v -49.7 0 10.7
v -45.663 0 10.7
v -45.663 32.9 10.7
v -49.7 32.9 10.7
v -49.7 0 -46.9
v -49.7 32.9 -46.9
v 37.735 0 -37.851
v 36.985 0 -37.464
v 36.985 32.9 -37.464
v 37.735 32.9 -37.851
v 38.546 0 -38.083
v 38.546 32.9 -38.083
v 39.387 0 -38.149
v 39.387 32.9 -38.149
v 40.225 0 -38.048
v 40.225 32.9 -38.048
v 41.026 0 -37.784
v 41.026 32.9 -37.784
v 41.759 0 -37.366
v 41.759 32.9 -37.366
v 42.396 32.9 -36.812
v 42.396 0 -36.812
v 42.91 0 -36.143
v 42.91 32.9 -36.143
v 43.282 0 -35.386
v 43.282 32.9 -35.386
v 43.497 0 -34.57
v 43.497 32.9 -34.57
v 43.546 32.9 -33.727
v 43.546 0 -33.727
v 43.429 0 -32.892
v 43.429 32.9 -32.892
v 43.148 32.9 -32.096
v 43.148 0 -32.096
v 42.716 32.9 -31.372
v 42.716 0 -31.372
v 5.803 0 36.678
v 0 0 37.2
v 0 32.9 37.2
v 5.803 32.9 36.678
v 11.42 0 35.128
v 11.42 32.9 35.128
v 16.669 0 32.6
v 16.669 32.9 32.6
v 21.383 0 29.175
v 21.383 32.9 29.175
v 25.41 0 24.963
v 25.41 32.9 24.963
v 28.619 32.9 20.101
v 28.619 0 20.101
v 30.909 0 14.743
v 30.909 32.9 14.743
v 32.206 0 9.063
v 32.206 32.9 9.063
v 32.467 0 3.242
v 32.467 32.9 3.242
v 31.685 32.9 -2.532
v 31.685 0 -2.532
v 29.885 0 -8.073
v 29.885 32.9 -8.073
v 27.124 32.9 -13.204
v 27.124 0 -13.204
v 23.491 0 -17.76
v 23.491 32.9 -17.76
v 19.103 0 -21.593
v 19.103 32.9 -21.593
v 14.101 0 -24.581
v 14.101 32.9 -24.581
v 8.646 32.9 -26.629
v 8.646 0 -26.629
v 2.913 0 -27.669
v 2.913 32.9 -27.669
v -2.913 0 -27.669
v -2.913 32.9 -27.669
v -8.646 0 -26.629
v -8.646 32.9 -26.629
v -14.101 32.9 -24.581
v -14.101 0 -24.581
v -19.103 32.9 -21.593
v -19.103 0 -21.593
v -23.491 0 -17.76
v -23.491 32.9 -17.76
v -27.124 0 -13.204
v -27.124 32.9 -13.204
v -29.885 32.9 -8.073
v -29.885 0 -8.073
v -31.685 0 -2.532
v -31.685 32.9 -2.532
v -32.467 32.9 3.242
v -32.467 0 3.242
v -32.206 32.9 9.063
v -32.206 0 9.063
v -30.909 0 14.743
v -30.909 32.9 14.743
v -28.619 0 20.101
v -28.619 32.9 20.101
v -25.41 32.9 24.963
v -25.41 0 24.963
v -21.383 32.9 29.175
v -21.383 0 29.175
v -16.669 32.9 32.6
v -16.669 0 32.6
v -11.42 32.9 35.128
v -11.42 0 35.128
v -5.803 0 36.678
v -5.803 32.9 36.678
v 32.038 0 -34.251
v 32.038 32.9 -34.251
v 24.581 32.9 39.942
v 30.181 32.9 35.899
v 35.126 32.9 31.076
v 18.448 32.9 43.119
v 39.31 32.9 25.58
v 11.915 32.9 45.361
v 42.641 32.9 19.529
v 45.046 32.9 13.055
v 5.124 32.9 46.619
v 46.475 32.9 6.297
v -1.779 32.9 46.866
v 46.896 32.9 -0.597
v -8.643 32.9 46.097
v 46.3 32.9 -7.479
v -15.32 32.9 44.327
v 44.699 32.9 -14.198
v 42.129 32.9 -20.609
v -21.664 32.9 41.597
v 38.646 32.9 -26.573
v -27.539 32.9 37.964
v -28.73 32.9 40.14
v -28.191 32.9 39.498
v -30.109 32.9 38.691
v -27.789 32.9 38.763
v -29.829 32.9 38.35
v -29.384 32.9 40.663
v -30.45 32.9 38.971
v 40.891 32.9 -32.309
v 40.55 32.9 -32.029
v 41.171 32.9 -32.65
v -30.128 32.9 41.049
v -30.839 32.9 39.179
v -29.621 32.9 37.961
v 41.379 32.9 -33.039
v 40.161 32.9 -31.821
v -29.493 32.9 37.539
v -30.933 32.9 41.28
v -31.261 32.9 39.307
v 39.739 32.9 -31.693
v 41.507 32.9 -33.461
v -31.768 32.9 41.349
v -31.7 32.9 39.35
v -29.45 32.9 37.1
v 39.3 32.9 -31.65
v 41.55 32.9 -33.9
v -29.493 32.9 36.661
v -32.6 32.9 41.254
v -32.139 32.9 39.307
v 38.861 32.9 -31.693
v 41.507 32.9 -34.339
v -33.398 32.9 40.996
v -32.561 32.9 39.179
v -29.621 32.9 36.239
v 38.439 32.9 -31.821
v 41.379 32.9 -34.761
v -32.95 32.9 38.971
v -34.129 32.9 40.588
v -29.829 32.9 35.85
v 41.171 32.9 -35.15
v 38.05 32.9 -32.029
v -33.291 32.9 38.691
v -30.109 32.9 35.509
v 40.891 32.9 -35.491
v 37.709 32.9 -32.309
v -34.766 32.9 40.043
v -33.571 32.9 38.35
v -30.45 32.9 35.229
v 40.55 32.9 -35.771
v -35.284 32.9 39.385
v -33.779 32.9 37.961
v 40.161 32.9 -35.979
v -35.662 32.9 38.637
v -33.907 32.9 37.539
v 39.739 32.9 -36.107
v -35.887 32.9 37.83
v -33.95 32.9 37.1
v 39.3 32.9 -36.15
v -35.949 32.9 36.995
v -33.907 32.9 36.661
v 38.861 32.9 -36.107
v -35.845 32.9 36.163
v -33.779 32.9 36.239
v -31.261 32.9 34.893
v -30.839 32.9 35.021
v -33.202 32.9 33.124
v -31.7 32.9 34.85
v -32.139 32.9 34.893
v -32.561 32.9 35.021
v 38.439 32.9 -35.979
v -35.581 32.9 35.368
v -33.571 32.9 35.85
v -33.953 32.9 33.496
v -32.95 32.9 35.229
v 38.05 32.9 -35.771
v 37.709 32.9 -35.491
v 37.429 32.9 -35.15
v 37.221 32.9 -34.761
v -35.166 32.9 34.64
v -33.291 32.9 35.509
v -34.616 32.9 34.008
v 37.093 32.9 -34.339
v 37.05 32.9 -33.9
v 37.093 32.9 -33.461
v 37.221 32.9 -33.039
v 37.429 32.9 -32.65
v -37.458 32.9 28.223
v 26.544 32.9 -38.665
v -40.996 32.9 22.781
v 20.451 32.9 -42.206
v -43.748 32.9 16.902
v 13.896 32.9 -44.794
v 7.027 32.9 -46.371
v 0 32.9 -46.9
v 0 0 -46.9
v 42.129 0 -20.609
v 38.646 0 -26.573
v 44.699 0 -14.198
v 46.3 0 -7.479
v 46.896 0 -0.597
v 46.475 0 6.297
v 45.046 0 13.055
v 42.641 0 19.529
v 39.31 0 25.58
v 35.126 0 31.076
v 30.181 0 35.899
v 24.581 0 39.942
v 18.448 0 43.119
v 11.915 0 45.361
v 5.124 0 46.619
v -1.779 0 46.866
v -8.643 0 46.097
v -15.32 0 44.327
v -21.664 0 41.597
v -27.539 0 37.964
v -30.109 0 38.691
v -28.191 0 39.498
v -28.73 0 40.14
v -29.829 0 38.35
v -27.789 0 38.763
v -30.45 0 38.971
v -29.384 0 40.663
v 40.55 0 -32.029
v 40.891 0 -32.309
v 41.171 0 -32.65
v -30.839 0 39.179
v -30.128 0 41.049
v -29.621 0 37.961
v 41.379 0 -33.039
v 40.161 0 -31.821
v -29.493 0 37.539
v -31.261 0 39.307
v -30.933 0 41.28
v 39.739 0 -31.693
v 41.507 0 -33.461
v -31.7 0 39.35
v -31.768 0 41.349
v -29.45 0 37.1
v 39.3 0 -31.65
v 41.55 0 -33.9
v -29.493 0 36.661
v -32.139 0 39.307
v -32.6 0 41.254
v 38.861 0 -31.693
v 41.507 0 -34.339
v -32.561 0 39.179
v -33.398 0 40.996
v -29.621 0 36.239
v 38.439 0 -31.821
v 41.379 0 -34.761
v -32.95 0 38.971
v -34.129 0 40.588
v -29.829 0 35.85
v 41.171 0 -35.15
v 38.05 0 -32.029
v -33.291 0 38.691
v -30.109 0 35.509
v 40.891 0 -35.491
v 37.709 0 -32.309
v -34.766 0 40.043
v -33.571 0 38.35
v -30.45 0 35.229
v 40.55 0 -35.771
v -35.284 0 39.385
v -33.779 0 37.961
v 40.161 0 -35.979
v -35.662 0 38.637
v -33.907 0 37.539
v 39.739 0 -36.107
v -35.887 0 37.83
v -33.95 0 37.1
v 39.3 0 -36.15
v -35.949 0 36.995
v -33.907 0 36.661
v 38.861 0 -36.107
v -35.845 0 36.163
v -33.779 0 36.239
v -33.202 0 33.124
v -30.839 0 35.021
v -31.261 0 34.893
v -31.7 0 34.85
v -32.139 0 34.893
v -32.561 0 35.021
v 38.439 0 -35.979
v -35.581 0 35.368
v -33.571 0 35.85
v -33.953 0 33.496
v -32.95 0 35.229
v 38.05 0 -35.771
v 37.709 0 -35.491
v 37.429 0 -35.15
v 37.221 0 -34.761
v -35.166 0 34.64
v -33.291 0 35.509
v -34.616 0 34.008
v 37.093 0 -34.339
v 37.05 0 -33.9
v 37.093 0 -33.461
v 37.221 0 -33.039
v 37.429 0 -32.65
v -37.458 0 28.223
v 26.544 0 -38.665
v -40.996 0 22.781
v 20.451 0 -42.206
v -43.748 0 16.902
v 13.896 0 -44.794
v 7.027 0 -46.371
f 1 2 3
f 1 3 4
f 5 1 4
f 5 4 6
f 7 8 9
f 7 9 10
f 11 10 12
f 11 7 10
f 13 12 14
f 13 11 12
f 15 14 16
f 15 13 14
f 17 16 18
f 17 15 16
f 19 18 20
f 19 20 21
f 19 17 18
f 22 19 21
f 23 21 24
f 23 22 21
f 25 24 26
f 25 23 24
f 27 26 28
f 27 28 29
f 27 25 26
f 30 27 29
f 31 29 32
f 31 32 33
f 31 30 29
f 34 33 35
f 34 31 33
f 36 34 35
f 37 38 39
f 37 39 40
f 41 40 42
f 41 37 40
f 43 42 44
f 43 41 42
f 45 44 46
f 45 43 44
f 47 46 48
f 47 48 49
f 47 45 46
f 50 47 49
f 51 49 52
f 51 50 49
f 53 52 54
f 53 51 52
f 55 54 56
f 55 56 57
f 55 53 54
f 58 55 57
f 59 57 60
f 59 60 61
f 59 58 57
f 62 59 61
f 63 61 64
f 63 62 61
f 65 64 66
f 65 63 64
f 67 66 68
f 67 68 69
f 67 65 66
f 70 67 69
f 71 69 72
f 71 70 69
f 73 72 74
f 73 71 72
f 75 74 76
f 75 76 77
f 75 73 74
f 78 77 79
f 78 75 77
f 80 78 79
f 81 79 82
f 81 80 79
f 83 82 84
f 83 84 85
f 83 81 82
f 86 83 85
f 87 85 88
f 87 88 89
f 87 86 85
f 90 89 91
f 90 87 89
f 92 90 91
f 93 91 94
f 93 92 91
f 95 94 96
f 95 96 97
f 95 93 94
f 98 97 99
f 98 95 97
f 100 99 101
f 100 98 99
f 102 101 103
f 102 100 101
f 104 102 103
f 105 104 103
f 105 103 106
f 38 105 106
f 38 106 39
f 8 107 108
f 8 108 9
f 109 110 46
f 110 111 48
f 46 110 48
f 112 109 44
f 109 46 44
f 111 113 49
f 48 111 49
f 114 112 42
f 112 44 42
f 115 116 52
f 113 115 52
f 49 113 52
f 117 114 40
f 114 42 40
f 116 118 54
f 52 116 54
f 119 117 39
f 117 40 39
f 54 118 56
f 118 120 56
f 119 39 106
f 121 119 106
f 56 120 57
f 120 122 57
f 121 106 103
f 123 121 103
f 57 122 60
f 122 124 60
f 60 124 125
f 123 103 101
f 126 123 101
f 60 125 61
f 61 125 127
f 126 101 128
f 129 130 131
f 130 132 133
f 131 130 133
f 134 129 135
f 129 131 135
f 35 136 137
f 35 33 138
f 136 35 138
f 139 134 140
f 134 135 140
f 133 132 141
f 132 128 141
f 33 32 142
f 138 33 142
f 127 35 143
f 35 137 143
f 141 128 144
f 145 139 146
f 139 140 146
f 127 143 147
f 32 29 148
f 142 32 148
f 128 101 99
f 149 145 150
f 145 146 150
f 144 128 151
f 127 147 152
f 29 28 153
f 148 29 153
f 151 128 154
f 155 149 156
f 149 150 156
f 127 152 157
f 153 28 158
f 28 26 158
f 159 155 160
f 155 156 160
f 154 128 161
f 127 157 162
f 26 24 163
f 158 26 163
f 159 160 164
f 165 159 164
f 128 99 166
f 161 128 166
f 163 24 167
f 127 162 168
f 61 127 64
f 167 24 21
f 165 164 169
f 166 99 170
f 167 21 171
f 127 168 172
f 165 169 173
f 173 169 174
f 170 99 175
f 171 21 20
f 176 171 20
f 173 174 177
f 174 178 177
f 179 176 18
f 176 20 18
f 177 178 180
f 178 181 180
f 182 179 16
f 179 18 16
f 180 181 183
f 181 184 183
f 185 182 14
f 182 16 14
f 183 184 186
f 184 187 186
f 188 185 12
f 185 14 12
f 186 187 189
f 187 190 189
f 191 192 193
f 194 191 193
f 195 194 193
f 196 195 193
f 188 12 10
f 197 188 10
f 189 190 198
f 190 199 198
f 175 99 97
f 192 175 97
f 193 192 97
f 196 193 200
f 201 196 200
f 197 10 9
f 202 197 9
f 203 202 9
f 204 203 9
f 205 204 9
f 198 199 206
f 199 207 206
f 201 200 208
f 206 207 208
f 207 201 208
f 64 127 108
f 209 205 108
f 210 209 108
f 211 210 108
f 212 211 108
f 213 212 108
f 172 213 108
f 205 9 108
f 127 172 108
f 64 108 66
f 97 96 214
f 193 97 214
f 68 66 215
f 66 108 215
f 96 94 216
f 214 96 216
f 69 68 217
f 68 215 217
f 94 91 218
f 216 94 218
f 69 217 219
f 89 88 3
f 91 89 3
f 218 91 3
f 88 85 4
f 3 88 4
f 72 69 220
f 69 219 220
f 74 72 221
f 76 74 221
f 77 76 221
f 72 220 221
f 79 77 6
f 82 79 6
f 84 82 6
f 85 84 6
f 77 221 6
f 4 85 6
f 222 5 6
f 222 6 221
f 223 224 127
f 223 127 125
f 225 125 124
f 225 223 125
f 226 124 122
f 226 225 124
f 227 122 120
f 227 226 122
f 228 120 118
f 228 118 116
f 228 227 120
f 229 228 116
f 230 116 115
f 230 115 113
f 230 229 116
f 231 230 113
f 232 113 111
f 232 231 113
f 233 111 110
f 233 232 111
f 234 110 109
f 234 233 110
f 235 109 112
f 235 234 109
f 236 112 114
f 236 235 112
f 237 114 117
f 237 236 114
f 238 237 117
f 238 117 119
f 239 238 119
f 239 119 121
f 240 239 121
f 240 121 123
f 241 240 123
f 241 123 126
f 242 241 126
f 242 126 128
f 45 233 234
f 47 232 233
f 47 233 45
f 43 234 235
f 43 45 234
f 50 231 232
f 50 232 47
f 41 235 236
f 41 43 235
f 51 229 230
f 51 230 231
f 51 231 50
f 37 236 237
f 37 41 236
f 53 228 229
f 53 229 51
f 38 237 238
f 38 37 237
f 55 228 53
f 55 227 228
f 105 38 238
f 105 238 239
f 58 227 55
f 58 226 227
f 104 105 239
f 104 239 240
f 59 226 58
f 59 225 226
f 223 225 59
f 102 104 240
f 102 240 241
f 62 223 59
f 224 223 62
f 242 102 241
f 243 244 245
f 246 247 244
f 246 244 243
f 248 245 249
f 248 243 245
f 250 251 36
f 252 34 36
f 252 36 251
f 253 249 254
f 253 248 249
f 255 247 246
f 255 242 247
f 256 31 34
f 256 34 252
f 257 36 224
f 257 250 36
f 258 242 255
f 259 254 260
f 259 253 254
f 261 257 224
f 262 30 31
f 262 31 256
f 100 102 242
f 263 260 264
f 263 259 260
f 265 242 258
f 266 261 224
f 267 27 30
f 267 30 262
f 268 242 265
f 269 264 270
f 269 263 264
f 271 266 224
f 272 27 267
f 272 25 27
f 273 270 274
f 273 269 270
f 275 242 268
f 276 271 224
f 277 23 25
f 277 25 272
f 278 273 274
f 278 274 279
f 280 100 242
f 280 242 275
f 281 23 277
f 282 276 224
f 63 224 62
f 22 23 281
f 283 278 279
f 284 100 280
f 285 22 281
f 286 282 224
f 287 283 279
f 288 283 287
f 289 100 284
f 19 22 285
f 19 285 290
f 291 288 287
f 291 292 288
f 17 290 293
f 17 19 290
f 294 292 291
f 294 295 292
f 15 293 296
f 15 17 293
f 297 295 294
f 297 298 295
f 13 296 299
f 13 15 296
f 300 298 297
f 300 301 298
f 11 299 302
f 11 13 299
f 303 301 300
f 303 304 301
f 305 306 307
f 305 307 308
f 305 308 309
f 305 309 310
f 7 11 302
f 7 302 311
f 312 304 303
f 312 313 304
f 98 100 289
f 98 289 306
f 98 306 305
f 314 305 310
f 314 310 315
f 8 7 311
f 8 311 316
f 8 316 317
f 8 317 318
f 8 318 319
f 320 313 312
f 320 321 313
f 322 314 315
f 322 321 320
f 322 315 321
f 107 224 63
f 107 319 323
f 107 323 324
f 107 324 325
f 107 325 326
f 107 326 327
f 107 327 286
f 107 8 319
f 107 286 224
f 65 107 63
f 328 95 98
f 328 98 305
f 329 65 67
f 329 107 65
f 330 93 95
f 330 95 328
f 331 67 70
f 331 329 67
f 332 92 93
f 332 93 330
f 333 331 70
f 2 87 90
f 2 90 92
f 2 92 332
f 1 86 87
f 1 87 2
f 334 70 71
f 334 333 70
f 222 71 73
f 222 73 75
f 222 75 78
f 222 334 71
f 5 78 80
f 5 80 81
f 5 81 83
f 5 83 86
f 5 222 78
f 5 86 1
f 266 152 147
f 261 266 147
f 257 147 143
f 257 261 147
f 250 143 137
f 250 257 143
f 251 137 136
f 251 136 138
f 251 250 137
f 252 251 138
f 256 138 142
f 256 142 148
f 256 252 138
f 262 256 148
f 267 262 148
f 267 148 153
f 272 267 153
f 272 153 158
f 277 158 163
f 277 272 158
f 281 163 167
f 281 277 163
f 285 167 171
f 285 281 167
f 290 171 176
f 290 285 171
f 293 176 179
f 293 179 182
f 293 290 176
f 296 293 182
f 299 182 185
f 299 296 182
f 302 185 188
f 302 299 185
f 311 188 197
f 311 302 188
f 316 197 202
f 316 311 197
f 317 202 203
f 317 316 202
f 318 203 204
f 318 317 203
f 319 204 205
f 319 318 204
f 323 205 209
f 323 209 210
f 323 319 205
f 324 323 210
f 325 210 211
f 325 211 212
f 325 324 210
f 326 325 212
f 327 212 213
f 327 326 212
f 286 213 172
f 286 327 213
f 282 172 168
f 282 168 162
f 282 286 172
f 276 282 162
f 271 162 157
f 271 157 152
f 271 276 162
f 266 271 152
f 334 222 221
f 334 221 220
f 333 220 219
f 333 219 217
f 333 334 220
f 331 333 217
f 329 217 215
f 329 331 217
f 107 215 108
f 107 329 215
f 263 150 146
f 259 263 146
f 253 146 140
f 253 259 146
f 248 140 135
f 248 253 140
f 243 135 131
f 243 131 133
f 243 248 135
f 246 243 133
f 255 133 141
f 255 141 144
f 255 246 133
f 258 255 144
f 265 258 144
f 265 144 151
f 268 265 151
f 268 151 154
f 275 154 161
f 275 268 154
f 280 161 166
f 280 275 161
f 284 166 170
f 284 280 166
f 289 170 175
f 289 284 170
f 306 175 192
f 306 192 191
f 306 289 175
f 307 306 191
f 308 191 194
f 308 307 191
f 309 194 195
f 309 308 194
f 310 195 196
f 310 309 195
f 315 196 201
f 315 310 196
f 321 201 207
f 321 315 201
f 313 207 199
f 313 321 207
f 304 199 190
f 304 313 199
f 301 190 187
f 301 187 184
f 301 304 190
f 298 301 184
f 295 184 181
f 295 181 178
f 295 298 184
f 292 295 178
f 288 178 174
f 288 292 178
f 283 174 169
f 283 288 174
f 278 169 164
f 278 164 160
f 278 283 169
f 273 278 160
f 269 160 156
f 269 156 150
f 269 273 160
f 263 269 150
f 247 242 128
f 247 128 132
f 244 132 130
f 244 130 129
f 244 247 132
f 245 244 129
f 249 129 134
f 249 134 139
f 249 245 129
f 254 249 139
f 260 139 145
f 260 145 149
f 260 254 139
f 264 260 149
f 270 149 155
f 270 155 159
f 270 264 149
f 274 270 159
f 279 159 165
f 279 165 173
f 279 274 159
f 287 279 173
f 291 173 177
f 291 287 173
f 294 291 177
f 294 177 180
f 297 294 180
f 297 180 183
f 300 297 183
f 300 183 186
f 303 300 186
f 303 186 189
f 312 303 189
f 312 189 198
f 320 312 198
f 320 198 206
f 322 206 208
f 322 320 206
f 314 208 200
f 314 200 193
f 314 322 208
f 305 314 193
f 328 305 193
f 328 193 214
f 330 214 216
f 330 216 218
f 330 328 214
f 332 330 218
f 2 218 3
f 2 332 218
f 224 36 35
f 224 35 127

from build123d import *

# Parameters (mm, degrees)
SKETCH_1_R      = 2.25
SKETCH_1_R_2    = 32.5
EXTRUDE_1_DEPTH = 32.9


with BuildPart() as part:
    # 草图1 → 凸台-拉伸1 (new body)
    with BuildSketch(Plane(origin=(0, 0, 0), x_dir=(1, 0, 0), z_dir=(0, 1, 0))):
        with BuildLine():
            Line((32.038228151, 34.251451604), (36.985161154, 37.464270068))
            ThreePointArc((36.985161154, 37.464270068), (42.395709987, 36.811885931), (42.716072869, 31.371572396))
            Line((42.716072869, 31.371572396), (38.645559751, 26.573120094))
            ThreePointArc((38.645559751, 26.573120094), (32.742735514, -33.578613299), (-27.538659341, -37.96356466))
            ThreePointArc((-27.538659341, -37.96356466), (-34.46083935, -40.331140059), (-33.202224105, -33.12434625))
            ThreePointArc((-33.202224105, -33.12434625), (-40.995709816, -22.780732575), (-45.663114217, -10.7))
            Line((-45.663114217, -10.7), (-49.7, -10.7))
            Line((-49.7, -10.7), (-49.7, 46.9))
            Line((-49.7, 46.9), (0, 46.9))
            ThreePointArc((0, 46.9), (17.222324463, 43.623405875), (32.038228151, 34.251451604))
        make_face()
        with Locations(Location((-31.7, -37.1, 0), (0, 0, 270))):
            Circle(SKETCH_1_R, mode=Mode.SUBTRACT)
        with Locations(Location((39.3, 33.9, 0), (0, 0, 270))):
            Circle(SKETCH_1_R, mode=Mode.SUBTRACT)
        with Locations(Location((0, -4.7, 0), (0, 0, 270))):
            Circle(SKETCH_1_R_2, mode=Mode.SUBTRACT)
    extrude(amount=EXTRUDE_1_DEPTH)


solid = part.part
